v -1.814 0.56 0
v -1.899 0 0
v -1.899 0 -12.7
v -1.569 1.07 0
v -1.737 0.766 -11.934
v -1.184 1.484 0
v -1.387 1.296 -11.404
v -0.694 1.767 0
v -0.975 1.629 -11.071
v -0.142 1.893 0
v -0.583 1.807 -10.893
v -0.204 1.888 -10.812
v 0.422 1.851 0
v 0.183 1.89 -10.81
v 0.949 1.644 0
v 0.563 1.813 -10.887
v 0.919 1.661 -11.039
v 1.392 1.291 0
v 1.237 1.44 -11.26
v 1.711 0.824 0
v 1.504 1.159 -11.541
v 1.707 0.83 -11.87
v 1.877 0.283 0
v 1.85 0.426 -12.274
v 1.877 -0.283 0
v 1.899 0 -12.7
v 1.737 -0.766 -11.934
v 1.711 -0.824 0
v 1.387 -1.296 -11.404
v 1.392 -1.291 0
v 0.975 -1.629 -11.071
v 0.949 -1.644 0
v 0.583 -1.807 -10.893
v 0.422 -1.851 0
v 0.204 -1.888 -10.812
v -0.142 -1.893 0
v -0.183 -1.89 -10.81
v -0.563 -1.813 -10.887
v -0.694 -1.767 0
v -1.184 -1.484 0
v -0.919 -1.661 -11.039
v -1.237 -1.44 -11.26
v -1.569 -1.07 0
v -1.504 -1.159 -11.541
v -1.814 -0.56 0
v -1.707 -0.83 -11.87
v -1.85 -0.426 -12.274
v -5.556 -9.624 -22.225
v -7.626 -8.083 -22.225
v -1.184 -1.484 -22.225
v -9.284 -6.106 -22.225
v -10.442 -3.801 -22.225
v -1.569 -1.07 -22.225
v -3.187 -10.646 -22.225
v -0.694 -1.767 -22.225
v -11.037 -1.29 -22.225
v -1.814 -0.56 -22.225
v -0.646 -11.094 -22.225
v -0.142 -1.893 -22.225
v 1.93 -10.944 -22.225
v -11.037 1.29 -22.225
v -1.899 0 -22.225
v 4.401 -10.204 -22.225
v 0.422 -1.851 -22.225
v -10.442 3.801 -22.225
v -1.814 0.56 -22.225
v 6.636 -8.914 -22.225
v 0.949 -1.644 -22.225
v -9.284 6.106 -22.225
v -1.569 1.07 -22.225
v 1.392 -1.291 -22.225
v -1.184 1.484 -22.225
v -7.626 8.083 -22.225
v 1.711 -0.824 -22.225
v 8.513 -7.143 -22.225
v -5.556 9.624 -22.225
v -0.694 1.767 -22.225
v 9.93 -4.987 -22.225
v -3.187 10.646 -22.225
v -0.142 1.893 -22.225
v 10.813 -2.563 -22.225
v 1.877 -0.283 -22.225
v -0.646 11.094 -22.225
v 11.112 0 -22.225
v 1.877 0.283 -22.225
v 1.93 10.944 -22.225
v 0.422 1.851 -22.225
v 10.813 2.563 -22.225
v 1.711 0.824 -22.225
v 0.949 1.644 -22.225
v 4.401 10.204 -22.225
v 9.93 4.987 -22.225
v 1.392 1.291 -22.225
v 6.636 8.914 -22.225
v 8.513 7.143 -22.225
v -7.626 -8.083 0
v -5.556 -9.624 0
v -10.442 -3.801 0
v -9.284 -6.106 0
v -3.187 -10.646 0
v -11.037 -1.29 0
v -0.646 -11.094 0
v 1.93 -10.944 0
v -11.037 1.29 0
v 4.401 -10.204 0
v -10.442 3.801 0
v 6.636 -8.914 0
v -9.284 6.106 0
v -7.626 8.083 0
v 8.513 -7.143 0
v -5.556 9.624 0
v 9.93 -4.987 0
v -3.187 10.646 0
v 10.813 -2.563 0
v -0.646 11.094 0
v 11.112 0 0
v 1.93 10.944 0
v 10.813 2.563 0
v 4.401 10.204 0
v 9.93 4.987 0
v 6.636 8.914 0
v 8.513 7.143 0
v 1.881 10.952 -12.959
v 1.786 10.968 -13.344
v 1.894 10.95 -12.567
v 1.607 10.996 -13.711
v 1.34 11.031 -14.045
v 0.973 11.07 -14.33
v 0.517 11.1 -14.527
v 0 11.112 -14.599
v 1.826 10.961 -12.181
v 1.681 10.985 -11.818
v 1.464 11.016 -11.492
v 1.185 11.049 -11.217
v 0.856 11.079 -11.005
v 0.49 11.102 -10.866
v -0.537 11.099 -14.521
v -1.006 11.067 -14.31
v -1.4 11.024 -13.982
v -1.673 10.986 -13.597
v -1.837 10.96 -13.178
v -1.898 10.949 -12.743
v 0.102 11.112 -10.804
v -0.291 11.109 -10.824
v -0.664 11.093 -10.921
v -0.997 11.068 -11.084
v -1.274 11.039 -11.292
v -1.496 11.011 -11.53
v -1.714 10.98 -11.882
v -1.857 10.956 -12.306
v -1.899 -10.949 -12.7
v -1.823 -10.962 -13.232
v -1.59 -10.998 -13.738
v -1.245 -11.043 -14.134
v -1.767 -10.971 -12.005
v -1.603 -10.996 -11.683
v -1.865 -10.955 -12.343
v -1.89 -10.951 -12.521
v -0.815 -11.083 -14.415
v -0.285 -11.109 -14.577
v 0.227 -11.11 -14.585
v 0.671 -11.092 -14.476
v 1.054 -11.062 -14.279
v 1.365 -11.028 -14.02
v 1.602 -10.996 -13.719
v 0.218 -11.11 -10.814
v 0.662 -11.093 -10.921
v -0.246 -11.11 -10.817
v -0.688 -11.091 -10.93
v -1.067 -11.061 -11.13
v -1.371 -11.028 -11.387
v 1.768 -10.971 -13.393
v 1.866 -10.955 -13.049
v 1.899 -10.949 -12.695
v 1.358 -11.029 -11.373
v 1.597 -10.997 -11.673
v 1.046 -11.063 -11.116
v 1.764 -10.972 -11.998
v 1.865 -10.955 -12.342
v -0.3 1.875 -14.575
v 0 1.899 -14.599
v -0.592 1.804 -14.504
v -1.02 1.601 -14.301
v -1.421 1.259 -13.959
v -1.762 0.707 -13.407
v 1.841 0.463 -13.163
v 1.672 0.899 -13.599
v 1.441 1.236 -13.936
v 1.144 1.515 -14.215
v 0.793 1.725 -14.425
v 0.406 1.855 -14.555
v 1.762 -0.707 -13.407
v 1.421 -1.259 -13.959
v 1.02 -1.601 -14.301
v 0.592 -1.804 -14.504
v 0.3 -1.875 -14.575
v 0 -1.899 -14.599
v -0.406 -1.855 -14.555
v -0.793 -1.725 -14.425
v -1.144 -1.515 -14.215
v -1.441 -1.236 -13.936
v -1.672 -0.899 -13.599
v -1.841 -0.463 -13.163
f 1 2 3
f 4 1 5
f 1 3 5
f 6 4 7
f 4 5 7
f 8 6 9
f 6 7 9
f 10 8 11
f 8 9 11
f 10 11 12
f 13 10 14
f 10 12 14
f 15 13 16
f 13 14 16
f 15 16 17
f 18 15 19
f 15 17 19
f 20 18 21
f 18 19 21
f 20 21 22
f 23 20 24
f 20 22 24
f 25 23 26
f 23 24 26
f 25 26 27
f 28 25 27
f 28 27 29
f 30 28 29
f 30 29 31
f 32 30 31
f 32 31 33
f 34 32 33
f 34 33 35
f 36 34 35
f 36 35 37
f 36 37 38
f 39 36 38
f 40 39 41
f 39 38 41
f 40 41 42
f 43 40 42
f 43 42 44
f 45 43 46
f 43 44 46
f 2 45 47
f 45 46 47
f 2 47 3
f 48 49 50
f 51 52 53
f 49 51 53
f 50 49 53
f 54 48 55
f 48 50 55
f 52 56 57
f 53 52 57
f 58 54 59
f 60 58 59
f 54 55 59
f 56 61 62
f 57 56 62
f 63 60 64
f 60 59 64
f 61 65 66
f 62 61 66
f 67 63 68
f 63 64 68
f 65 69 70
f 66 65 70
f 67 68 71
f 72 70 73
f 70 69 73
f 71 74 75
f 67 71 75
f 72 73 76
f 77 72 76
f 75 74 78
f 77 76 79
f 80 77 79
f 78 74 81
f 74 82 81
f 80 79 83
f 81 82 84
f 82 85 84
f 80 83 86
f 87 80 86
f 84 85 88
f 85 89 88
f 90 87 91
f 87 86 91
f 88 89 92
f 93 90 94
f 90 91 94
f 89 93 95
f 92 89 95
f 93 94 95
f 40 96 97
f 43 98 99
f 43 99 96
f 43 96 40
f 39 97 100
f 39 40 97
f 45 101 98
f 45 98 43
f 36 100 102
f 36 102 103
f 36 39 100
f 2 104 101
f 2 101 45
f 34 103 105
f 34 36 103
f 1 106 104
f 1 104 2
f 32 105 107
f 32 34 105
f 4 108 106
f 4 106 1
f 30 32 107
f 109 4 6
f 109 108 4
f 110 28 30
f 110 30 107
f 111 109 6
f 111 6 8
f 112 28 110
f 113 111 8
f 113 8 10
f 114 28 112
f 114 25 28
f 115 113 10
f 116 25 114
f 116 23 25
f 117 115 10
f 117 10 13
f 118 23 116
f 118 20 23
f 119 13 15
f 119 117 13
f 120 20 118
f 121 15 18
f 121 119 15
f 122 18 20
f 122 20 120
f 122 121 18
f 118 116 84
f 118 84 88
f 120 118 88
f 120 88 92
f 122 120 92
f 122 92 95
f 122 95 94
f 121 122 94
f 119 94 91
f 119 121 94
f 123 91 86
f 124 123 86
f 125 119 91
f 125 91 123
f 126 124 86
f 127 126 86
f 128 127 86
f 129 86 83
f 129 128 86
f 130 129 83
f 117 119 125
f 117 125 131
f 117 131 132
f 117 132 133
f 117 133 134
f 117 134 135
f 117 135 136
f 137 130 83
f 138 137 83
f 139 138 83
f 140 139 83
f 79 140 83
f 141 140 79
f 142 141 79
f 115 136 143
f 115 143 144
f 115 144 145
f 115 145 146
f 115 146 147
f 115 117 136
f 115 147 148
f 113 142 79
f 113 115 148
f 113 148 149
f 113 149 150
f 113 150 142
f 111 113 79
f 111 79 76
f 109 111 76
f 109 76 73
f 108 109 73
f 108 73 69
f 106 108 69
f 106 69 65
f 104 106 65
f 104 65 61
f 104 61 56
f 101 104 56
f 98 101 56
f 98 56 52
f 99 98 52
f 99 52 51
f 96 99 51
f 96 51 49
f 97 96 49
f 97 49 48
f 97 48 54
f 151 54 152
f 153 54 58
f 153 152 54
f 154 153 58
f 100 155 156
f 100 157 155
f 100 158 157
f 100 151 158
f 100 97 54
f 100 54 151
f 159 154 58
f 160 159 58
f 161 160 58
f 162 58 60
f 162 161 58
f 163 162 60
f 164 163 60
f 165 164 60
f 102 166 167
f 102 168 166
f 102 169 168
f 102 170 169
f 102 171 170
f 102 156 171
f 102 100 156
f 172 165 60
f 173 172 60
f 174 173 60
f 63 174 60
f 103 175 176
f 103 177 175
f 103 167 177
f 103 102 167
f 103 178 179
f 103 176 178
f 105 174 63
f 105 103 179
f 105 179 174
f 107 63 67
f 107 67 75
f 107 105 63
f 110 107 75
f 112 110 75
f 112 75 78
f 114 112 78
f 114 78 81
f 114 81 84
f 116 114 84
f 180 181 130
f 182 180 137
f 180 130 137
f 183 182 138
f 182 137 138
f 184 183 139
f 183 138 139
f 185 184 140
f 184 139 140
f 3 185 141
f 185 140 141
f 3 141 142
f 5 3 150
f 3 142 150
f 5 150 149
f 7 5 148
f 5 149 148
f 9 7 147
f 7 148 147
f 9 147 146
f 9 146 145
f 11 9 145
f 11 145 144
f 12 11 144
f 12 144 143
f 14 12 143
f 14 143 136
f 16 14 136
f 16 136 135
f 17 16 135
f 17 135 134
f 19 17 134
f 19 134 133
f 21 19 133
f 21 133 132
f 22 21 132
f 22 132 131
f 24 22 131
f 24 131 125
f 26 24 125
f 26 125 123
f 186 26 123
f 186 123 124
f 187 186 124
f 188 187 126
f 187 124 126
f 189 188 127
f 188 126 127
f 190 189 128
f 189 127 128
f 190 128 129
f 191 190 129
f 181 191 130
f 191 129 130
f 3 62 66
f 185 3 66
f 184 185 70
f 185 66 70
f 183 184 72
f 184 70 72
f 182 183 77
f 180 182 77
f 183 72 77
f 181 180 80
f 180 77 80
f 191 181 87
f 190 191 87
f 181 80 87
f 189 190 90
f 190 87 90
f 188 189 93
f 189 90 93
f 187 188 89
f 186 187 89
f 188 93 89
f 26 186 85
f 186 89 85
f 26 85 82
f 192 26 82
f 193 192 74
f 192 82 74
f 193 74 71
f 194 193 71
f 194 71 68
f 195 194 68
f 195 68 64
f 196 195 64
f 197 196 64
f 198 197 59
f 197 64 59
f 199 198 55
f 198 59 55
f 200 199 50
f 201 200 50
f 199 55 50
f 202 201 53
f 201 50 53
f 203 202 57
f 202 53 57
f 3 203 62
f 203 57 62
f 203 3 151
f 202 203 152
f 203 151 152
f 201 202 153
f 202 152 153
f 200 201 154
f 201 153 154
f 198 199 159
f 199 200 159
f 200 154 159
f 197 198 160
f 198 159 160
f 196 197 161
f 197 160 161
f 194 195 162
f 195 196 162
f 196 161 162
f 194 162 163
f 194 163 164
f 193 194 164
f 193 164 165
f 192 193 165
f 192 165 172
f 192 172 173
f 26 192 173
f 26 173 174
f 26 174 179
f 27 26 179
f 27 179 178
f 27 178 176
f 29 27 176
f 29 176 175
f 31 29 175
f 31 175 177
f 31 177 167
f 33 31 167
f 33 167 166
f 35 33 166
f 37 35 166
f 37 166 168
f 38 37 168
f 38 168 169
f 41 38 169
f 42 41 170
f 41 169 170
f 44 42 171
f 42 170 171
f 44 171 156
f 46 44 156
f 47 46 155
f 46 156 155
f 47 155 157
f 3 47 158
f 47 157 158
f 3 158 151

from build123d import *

# Parameters (mm, degrees)
SKETCH2_R              = 11.1125
BOSS_EXTRUDE1_DEPTH    = 22.225
F_10_24_TAPPED_HOLE1_D = 3.7973
SKETCH7_W              = 1.89865
SKETCH7_H              = 11.1125
F_10_24_TAPPED_HOLE3_D = 3.7973


with BuildPart() as part:
    # Sketch2 → Boss-Extrude1 (new body)
    with BuildSketch(Plane.XY):
        Circle(SKETCH2_R)
    extrude(amount=-BOSS_EXTRUDE1_DEPTH)

    # #10-24 Tapped Hole1 (through all)
    with Locations(Plane.XY):
        with Locations((0, 0)):
            Hole(F_10_24_TAPPED_HOLE1_D / 2)

    # Sketch7 → #10-24 Tapped Hole2 (revolve, cut)
    with BuildSketch(Plane(origin=(0, 0, -12.7), x_dir=(0, 0, -1), z_dir=(1, 0, 0))):
        with Locations((0.949325, 5.55625)):
            Rectangle(SKETCH7_W, SKETCH7_H)
    revolve(axis=Axis((0, -6.35, -12.7), (0, 1, 0)), mode=Mode.SUBTRACT)

    # #10-24 Tapped Hole3 (through all)
    with Locations(Plane(origin=(0, 0, 0), x_dir=(1, 0, 0), z_dir=(0, 1, 0))):
        with Locations((0, 12.7)):
            Hole(F_10_24_TAPPED_HOLE3_D / 2)


solid = part.part
